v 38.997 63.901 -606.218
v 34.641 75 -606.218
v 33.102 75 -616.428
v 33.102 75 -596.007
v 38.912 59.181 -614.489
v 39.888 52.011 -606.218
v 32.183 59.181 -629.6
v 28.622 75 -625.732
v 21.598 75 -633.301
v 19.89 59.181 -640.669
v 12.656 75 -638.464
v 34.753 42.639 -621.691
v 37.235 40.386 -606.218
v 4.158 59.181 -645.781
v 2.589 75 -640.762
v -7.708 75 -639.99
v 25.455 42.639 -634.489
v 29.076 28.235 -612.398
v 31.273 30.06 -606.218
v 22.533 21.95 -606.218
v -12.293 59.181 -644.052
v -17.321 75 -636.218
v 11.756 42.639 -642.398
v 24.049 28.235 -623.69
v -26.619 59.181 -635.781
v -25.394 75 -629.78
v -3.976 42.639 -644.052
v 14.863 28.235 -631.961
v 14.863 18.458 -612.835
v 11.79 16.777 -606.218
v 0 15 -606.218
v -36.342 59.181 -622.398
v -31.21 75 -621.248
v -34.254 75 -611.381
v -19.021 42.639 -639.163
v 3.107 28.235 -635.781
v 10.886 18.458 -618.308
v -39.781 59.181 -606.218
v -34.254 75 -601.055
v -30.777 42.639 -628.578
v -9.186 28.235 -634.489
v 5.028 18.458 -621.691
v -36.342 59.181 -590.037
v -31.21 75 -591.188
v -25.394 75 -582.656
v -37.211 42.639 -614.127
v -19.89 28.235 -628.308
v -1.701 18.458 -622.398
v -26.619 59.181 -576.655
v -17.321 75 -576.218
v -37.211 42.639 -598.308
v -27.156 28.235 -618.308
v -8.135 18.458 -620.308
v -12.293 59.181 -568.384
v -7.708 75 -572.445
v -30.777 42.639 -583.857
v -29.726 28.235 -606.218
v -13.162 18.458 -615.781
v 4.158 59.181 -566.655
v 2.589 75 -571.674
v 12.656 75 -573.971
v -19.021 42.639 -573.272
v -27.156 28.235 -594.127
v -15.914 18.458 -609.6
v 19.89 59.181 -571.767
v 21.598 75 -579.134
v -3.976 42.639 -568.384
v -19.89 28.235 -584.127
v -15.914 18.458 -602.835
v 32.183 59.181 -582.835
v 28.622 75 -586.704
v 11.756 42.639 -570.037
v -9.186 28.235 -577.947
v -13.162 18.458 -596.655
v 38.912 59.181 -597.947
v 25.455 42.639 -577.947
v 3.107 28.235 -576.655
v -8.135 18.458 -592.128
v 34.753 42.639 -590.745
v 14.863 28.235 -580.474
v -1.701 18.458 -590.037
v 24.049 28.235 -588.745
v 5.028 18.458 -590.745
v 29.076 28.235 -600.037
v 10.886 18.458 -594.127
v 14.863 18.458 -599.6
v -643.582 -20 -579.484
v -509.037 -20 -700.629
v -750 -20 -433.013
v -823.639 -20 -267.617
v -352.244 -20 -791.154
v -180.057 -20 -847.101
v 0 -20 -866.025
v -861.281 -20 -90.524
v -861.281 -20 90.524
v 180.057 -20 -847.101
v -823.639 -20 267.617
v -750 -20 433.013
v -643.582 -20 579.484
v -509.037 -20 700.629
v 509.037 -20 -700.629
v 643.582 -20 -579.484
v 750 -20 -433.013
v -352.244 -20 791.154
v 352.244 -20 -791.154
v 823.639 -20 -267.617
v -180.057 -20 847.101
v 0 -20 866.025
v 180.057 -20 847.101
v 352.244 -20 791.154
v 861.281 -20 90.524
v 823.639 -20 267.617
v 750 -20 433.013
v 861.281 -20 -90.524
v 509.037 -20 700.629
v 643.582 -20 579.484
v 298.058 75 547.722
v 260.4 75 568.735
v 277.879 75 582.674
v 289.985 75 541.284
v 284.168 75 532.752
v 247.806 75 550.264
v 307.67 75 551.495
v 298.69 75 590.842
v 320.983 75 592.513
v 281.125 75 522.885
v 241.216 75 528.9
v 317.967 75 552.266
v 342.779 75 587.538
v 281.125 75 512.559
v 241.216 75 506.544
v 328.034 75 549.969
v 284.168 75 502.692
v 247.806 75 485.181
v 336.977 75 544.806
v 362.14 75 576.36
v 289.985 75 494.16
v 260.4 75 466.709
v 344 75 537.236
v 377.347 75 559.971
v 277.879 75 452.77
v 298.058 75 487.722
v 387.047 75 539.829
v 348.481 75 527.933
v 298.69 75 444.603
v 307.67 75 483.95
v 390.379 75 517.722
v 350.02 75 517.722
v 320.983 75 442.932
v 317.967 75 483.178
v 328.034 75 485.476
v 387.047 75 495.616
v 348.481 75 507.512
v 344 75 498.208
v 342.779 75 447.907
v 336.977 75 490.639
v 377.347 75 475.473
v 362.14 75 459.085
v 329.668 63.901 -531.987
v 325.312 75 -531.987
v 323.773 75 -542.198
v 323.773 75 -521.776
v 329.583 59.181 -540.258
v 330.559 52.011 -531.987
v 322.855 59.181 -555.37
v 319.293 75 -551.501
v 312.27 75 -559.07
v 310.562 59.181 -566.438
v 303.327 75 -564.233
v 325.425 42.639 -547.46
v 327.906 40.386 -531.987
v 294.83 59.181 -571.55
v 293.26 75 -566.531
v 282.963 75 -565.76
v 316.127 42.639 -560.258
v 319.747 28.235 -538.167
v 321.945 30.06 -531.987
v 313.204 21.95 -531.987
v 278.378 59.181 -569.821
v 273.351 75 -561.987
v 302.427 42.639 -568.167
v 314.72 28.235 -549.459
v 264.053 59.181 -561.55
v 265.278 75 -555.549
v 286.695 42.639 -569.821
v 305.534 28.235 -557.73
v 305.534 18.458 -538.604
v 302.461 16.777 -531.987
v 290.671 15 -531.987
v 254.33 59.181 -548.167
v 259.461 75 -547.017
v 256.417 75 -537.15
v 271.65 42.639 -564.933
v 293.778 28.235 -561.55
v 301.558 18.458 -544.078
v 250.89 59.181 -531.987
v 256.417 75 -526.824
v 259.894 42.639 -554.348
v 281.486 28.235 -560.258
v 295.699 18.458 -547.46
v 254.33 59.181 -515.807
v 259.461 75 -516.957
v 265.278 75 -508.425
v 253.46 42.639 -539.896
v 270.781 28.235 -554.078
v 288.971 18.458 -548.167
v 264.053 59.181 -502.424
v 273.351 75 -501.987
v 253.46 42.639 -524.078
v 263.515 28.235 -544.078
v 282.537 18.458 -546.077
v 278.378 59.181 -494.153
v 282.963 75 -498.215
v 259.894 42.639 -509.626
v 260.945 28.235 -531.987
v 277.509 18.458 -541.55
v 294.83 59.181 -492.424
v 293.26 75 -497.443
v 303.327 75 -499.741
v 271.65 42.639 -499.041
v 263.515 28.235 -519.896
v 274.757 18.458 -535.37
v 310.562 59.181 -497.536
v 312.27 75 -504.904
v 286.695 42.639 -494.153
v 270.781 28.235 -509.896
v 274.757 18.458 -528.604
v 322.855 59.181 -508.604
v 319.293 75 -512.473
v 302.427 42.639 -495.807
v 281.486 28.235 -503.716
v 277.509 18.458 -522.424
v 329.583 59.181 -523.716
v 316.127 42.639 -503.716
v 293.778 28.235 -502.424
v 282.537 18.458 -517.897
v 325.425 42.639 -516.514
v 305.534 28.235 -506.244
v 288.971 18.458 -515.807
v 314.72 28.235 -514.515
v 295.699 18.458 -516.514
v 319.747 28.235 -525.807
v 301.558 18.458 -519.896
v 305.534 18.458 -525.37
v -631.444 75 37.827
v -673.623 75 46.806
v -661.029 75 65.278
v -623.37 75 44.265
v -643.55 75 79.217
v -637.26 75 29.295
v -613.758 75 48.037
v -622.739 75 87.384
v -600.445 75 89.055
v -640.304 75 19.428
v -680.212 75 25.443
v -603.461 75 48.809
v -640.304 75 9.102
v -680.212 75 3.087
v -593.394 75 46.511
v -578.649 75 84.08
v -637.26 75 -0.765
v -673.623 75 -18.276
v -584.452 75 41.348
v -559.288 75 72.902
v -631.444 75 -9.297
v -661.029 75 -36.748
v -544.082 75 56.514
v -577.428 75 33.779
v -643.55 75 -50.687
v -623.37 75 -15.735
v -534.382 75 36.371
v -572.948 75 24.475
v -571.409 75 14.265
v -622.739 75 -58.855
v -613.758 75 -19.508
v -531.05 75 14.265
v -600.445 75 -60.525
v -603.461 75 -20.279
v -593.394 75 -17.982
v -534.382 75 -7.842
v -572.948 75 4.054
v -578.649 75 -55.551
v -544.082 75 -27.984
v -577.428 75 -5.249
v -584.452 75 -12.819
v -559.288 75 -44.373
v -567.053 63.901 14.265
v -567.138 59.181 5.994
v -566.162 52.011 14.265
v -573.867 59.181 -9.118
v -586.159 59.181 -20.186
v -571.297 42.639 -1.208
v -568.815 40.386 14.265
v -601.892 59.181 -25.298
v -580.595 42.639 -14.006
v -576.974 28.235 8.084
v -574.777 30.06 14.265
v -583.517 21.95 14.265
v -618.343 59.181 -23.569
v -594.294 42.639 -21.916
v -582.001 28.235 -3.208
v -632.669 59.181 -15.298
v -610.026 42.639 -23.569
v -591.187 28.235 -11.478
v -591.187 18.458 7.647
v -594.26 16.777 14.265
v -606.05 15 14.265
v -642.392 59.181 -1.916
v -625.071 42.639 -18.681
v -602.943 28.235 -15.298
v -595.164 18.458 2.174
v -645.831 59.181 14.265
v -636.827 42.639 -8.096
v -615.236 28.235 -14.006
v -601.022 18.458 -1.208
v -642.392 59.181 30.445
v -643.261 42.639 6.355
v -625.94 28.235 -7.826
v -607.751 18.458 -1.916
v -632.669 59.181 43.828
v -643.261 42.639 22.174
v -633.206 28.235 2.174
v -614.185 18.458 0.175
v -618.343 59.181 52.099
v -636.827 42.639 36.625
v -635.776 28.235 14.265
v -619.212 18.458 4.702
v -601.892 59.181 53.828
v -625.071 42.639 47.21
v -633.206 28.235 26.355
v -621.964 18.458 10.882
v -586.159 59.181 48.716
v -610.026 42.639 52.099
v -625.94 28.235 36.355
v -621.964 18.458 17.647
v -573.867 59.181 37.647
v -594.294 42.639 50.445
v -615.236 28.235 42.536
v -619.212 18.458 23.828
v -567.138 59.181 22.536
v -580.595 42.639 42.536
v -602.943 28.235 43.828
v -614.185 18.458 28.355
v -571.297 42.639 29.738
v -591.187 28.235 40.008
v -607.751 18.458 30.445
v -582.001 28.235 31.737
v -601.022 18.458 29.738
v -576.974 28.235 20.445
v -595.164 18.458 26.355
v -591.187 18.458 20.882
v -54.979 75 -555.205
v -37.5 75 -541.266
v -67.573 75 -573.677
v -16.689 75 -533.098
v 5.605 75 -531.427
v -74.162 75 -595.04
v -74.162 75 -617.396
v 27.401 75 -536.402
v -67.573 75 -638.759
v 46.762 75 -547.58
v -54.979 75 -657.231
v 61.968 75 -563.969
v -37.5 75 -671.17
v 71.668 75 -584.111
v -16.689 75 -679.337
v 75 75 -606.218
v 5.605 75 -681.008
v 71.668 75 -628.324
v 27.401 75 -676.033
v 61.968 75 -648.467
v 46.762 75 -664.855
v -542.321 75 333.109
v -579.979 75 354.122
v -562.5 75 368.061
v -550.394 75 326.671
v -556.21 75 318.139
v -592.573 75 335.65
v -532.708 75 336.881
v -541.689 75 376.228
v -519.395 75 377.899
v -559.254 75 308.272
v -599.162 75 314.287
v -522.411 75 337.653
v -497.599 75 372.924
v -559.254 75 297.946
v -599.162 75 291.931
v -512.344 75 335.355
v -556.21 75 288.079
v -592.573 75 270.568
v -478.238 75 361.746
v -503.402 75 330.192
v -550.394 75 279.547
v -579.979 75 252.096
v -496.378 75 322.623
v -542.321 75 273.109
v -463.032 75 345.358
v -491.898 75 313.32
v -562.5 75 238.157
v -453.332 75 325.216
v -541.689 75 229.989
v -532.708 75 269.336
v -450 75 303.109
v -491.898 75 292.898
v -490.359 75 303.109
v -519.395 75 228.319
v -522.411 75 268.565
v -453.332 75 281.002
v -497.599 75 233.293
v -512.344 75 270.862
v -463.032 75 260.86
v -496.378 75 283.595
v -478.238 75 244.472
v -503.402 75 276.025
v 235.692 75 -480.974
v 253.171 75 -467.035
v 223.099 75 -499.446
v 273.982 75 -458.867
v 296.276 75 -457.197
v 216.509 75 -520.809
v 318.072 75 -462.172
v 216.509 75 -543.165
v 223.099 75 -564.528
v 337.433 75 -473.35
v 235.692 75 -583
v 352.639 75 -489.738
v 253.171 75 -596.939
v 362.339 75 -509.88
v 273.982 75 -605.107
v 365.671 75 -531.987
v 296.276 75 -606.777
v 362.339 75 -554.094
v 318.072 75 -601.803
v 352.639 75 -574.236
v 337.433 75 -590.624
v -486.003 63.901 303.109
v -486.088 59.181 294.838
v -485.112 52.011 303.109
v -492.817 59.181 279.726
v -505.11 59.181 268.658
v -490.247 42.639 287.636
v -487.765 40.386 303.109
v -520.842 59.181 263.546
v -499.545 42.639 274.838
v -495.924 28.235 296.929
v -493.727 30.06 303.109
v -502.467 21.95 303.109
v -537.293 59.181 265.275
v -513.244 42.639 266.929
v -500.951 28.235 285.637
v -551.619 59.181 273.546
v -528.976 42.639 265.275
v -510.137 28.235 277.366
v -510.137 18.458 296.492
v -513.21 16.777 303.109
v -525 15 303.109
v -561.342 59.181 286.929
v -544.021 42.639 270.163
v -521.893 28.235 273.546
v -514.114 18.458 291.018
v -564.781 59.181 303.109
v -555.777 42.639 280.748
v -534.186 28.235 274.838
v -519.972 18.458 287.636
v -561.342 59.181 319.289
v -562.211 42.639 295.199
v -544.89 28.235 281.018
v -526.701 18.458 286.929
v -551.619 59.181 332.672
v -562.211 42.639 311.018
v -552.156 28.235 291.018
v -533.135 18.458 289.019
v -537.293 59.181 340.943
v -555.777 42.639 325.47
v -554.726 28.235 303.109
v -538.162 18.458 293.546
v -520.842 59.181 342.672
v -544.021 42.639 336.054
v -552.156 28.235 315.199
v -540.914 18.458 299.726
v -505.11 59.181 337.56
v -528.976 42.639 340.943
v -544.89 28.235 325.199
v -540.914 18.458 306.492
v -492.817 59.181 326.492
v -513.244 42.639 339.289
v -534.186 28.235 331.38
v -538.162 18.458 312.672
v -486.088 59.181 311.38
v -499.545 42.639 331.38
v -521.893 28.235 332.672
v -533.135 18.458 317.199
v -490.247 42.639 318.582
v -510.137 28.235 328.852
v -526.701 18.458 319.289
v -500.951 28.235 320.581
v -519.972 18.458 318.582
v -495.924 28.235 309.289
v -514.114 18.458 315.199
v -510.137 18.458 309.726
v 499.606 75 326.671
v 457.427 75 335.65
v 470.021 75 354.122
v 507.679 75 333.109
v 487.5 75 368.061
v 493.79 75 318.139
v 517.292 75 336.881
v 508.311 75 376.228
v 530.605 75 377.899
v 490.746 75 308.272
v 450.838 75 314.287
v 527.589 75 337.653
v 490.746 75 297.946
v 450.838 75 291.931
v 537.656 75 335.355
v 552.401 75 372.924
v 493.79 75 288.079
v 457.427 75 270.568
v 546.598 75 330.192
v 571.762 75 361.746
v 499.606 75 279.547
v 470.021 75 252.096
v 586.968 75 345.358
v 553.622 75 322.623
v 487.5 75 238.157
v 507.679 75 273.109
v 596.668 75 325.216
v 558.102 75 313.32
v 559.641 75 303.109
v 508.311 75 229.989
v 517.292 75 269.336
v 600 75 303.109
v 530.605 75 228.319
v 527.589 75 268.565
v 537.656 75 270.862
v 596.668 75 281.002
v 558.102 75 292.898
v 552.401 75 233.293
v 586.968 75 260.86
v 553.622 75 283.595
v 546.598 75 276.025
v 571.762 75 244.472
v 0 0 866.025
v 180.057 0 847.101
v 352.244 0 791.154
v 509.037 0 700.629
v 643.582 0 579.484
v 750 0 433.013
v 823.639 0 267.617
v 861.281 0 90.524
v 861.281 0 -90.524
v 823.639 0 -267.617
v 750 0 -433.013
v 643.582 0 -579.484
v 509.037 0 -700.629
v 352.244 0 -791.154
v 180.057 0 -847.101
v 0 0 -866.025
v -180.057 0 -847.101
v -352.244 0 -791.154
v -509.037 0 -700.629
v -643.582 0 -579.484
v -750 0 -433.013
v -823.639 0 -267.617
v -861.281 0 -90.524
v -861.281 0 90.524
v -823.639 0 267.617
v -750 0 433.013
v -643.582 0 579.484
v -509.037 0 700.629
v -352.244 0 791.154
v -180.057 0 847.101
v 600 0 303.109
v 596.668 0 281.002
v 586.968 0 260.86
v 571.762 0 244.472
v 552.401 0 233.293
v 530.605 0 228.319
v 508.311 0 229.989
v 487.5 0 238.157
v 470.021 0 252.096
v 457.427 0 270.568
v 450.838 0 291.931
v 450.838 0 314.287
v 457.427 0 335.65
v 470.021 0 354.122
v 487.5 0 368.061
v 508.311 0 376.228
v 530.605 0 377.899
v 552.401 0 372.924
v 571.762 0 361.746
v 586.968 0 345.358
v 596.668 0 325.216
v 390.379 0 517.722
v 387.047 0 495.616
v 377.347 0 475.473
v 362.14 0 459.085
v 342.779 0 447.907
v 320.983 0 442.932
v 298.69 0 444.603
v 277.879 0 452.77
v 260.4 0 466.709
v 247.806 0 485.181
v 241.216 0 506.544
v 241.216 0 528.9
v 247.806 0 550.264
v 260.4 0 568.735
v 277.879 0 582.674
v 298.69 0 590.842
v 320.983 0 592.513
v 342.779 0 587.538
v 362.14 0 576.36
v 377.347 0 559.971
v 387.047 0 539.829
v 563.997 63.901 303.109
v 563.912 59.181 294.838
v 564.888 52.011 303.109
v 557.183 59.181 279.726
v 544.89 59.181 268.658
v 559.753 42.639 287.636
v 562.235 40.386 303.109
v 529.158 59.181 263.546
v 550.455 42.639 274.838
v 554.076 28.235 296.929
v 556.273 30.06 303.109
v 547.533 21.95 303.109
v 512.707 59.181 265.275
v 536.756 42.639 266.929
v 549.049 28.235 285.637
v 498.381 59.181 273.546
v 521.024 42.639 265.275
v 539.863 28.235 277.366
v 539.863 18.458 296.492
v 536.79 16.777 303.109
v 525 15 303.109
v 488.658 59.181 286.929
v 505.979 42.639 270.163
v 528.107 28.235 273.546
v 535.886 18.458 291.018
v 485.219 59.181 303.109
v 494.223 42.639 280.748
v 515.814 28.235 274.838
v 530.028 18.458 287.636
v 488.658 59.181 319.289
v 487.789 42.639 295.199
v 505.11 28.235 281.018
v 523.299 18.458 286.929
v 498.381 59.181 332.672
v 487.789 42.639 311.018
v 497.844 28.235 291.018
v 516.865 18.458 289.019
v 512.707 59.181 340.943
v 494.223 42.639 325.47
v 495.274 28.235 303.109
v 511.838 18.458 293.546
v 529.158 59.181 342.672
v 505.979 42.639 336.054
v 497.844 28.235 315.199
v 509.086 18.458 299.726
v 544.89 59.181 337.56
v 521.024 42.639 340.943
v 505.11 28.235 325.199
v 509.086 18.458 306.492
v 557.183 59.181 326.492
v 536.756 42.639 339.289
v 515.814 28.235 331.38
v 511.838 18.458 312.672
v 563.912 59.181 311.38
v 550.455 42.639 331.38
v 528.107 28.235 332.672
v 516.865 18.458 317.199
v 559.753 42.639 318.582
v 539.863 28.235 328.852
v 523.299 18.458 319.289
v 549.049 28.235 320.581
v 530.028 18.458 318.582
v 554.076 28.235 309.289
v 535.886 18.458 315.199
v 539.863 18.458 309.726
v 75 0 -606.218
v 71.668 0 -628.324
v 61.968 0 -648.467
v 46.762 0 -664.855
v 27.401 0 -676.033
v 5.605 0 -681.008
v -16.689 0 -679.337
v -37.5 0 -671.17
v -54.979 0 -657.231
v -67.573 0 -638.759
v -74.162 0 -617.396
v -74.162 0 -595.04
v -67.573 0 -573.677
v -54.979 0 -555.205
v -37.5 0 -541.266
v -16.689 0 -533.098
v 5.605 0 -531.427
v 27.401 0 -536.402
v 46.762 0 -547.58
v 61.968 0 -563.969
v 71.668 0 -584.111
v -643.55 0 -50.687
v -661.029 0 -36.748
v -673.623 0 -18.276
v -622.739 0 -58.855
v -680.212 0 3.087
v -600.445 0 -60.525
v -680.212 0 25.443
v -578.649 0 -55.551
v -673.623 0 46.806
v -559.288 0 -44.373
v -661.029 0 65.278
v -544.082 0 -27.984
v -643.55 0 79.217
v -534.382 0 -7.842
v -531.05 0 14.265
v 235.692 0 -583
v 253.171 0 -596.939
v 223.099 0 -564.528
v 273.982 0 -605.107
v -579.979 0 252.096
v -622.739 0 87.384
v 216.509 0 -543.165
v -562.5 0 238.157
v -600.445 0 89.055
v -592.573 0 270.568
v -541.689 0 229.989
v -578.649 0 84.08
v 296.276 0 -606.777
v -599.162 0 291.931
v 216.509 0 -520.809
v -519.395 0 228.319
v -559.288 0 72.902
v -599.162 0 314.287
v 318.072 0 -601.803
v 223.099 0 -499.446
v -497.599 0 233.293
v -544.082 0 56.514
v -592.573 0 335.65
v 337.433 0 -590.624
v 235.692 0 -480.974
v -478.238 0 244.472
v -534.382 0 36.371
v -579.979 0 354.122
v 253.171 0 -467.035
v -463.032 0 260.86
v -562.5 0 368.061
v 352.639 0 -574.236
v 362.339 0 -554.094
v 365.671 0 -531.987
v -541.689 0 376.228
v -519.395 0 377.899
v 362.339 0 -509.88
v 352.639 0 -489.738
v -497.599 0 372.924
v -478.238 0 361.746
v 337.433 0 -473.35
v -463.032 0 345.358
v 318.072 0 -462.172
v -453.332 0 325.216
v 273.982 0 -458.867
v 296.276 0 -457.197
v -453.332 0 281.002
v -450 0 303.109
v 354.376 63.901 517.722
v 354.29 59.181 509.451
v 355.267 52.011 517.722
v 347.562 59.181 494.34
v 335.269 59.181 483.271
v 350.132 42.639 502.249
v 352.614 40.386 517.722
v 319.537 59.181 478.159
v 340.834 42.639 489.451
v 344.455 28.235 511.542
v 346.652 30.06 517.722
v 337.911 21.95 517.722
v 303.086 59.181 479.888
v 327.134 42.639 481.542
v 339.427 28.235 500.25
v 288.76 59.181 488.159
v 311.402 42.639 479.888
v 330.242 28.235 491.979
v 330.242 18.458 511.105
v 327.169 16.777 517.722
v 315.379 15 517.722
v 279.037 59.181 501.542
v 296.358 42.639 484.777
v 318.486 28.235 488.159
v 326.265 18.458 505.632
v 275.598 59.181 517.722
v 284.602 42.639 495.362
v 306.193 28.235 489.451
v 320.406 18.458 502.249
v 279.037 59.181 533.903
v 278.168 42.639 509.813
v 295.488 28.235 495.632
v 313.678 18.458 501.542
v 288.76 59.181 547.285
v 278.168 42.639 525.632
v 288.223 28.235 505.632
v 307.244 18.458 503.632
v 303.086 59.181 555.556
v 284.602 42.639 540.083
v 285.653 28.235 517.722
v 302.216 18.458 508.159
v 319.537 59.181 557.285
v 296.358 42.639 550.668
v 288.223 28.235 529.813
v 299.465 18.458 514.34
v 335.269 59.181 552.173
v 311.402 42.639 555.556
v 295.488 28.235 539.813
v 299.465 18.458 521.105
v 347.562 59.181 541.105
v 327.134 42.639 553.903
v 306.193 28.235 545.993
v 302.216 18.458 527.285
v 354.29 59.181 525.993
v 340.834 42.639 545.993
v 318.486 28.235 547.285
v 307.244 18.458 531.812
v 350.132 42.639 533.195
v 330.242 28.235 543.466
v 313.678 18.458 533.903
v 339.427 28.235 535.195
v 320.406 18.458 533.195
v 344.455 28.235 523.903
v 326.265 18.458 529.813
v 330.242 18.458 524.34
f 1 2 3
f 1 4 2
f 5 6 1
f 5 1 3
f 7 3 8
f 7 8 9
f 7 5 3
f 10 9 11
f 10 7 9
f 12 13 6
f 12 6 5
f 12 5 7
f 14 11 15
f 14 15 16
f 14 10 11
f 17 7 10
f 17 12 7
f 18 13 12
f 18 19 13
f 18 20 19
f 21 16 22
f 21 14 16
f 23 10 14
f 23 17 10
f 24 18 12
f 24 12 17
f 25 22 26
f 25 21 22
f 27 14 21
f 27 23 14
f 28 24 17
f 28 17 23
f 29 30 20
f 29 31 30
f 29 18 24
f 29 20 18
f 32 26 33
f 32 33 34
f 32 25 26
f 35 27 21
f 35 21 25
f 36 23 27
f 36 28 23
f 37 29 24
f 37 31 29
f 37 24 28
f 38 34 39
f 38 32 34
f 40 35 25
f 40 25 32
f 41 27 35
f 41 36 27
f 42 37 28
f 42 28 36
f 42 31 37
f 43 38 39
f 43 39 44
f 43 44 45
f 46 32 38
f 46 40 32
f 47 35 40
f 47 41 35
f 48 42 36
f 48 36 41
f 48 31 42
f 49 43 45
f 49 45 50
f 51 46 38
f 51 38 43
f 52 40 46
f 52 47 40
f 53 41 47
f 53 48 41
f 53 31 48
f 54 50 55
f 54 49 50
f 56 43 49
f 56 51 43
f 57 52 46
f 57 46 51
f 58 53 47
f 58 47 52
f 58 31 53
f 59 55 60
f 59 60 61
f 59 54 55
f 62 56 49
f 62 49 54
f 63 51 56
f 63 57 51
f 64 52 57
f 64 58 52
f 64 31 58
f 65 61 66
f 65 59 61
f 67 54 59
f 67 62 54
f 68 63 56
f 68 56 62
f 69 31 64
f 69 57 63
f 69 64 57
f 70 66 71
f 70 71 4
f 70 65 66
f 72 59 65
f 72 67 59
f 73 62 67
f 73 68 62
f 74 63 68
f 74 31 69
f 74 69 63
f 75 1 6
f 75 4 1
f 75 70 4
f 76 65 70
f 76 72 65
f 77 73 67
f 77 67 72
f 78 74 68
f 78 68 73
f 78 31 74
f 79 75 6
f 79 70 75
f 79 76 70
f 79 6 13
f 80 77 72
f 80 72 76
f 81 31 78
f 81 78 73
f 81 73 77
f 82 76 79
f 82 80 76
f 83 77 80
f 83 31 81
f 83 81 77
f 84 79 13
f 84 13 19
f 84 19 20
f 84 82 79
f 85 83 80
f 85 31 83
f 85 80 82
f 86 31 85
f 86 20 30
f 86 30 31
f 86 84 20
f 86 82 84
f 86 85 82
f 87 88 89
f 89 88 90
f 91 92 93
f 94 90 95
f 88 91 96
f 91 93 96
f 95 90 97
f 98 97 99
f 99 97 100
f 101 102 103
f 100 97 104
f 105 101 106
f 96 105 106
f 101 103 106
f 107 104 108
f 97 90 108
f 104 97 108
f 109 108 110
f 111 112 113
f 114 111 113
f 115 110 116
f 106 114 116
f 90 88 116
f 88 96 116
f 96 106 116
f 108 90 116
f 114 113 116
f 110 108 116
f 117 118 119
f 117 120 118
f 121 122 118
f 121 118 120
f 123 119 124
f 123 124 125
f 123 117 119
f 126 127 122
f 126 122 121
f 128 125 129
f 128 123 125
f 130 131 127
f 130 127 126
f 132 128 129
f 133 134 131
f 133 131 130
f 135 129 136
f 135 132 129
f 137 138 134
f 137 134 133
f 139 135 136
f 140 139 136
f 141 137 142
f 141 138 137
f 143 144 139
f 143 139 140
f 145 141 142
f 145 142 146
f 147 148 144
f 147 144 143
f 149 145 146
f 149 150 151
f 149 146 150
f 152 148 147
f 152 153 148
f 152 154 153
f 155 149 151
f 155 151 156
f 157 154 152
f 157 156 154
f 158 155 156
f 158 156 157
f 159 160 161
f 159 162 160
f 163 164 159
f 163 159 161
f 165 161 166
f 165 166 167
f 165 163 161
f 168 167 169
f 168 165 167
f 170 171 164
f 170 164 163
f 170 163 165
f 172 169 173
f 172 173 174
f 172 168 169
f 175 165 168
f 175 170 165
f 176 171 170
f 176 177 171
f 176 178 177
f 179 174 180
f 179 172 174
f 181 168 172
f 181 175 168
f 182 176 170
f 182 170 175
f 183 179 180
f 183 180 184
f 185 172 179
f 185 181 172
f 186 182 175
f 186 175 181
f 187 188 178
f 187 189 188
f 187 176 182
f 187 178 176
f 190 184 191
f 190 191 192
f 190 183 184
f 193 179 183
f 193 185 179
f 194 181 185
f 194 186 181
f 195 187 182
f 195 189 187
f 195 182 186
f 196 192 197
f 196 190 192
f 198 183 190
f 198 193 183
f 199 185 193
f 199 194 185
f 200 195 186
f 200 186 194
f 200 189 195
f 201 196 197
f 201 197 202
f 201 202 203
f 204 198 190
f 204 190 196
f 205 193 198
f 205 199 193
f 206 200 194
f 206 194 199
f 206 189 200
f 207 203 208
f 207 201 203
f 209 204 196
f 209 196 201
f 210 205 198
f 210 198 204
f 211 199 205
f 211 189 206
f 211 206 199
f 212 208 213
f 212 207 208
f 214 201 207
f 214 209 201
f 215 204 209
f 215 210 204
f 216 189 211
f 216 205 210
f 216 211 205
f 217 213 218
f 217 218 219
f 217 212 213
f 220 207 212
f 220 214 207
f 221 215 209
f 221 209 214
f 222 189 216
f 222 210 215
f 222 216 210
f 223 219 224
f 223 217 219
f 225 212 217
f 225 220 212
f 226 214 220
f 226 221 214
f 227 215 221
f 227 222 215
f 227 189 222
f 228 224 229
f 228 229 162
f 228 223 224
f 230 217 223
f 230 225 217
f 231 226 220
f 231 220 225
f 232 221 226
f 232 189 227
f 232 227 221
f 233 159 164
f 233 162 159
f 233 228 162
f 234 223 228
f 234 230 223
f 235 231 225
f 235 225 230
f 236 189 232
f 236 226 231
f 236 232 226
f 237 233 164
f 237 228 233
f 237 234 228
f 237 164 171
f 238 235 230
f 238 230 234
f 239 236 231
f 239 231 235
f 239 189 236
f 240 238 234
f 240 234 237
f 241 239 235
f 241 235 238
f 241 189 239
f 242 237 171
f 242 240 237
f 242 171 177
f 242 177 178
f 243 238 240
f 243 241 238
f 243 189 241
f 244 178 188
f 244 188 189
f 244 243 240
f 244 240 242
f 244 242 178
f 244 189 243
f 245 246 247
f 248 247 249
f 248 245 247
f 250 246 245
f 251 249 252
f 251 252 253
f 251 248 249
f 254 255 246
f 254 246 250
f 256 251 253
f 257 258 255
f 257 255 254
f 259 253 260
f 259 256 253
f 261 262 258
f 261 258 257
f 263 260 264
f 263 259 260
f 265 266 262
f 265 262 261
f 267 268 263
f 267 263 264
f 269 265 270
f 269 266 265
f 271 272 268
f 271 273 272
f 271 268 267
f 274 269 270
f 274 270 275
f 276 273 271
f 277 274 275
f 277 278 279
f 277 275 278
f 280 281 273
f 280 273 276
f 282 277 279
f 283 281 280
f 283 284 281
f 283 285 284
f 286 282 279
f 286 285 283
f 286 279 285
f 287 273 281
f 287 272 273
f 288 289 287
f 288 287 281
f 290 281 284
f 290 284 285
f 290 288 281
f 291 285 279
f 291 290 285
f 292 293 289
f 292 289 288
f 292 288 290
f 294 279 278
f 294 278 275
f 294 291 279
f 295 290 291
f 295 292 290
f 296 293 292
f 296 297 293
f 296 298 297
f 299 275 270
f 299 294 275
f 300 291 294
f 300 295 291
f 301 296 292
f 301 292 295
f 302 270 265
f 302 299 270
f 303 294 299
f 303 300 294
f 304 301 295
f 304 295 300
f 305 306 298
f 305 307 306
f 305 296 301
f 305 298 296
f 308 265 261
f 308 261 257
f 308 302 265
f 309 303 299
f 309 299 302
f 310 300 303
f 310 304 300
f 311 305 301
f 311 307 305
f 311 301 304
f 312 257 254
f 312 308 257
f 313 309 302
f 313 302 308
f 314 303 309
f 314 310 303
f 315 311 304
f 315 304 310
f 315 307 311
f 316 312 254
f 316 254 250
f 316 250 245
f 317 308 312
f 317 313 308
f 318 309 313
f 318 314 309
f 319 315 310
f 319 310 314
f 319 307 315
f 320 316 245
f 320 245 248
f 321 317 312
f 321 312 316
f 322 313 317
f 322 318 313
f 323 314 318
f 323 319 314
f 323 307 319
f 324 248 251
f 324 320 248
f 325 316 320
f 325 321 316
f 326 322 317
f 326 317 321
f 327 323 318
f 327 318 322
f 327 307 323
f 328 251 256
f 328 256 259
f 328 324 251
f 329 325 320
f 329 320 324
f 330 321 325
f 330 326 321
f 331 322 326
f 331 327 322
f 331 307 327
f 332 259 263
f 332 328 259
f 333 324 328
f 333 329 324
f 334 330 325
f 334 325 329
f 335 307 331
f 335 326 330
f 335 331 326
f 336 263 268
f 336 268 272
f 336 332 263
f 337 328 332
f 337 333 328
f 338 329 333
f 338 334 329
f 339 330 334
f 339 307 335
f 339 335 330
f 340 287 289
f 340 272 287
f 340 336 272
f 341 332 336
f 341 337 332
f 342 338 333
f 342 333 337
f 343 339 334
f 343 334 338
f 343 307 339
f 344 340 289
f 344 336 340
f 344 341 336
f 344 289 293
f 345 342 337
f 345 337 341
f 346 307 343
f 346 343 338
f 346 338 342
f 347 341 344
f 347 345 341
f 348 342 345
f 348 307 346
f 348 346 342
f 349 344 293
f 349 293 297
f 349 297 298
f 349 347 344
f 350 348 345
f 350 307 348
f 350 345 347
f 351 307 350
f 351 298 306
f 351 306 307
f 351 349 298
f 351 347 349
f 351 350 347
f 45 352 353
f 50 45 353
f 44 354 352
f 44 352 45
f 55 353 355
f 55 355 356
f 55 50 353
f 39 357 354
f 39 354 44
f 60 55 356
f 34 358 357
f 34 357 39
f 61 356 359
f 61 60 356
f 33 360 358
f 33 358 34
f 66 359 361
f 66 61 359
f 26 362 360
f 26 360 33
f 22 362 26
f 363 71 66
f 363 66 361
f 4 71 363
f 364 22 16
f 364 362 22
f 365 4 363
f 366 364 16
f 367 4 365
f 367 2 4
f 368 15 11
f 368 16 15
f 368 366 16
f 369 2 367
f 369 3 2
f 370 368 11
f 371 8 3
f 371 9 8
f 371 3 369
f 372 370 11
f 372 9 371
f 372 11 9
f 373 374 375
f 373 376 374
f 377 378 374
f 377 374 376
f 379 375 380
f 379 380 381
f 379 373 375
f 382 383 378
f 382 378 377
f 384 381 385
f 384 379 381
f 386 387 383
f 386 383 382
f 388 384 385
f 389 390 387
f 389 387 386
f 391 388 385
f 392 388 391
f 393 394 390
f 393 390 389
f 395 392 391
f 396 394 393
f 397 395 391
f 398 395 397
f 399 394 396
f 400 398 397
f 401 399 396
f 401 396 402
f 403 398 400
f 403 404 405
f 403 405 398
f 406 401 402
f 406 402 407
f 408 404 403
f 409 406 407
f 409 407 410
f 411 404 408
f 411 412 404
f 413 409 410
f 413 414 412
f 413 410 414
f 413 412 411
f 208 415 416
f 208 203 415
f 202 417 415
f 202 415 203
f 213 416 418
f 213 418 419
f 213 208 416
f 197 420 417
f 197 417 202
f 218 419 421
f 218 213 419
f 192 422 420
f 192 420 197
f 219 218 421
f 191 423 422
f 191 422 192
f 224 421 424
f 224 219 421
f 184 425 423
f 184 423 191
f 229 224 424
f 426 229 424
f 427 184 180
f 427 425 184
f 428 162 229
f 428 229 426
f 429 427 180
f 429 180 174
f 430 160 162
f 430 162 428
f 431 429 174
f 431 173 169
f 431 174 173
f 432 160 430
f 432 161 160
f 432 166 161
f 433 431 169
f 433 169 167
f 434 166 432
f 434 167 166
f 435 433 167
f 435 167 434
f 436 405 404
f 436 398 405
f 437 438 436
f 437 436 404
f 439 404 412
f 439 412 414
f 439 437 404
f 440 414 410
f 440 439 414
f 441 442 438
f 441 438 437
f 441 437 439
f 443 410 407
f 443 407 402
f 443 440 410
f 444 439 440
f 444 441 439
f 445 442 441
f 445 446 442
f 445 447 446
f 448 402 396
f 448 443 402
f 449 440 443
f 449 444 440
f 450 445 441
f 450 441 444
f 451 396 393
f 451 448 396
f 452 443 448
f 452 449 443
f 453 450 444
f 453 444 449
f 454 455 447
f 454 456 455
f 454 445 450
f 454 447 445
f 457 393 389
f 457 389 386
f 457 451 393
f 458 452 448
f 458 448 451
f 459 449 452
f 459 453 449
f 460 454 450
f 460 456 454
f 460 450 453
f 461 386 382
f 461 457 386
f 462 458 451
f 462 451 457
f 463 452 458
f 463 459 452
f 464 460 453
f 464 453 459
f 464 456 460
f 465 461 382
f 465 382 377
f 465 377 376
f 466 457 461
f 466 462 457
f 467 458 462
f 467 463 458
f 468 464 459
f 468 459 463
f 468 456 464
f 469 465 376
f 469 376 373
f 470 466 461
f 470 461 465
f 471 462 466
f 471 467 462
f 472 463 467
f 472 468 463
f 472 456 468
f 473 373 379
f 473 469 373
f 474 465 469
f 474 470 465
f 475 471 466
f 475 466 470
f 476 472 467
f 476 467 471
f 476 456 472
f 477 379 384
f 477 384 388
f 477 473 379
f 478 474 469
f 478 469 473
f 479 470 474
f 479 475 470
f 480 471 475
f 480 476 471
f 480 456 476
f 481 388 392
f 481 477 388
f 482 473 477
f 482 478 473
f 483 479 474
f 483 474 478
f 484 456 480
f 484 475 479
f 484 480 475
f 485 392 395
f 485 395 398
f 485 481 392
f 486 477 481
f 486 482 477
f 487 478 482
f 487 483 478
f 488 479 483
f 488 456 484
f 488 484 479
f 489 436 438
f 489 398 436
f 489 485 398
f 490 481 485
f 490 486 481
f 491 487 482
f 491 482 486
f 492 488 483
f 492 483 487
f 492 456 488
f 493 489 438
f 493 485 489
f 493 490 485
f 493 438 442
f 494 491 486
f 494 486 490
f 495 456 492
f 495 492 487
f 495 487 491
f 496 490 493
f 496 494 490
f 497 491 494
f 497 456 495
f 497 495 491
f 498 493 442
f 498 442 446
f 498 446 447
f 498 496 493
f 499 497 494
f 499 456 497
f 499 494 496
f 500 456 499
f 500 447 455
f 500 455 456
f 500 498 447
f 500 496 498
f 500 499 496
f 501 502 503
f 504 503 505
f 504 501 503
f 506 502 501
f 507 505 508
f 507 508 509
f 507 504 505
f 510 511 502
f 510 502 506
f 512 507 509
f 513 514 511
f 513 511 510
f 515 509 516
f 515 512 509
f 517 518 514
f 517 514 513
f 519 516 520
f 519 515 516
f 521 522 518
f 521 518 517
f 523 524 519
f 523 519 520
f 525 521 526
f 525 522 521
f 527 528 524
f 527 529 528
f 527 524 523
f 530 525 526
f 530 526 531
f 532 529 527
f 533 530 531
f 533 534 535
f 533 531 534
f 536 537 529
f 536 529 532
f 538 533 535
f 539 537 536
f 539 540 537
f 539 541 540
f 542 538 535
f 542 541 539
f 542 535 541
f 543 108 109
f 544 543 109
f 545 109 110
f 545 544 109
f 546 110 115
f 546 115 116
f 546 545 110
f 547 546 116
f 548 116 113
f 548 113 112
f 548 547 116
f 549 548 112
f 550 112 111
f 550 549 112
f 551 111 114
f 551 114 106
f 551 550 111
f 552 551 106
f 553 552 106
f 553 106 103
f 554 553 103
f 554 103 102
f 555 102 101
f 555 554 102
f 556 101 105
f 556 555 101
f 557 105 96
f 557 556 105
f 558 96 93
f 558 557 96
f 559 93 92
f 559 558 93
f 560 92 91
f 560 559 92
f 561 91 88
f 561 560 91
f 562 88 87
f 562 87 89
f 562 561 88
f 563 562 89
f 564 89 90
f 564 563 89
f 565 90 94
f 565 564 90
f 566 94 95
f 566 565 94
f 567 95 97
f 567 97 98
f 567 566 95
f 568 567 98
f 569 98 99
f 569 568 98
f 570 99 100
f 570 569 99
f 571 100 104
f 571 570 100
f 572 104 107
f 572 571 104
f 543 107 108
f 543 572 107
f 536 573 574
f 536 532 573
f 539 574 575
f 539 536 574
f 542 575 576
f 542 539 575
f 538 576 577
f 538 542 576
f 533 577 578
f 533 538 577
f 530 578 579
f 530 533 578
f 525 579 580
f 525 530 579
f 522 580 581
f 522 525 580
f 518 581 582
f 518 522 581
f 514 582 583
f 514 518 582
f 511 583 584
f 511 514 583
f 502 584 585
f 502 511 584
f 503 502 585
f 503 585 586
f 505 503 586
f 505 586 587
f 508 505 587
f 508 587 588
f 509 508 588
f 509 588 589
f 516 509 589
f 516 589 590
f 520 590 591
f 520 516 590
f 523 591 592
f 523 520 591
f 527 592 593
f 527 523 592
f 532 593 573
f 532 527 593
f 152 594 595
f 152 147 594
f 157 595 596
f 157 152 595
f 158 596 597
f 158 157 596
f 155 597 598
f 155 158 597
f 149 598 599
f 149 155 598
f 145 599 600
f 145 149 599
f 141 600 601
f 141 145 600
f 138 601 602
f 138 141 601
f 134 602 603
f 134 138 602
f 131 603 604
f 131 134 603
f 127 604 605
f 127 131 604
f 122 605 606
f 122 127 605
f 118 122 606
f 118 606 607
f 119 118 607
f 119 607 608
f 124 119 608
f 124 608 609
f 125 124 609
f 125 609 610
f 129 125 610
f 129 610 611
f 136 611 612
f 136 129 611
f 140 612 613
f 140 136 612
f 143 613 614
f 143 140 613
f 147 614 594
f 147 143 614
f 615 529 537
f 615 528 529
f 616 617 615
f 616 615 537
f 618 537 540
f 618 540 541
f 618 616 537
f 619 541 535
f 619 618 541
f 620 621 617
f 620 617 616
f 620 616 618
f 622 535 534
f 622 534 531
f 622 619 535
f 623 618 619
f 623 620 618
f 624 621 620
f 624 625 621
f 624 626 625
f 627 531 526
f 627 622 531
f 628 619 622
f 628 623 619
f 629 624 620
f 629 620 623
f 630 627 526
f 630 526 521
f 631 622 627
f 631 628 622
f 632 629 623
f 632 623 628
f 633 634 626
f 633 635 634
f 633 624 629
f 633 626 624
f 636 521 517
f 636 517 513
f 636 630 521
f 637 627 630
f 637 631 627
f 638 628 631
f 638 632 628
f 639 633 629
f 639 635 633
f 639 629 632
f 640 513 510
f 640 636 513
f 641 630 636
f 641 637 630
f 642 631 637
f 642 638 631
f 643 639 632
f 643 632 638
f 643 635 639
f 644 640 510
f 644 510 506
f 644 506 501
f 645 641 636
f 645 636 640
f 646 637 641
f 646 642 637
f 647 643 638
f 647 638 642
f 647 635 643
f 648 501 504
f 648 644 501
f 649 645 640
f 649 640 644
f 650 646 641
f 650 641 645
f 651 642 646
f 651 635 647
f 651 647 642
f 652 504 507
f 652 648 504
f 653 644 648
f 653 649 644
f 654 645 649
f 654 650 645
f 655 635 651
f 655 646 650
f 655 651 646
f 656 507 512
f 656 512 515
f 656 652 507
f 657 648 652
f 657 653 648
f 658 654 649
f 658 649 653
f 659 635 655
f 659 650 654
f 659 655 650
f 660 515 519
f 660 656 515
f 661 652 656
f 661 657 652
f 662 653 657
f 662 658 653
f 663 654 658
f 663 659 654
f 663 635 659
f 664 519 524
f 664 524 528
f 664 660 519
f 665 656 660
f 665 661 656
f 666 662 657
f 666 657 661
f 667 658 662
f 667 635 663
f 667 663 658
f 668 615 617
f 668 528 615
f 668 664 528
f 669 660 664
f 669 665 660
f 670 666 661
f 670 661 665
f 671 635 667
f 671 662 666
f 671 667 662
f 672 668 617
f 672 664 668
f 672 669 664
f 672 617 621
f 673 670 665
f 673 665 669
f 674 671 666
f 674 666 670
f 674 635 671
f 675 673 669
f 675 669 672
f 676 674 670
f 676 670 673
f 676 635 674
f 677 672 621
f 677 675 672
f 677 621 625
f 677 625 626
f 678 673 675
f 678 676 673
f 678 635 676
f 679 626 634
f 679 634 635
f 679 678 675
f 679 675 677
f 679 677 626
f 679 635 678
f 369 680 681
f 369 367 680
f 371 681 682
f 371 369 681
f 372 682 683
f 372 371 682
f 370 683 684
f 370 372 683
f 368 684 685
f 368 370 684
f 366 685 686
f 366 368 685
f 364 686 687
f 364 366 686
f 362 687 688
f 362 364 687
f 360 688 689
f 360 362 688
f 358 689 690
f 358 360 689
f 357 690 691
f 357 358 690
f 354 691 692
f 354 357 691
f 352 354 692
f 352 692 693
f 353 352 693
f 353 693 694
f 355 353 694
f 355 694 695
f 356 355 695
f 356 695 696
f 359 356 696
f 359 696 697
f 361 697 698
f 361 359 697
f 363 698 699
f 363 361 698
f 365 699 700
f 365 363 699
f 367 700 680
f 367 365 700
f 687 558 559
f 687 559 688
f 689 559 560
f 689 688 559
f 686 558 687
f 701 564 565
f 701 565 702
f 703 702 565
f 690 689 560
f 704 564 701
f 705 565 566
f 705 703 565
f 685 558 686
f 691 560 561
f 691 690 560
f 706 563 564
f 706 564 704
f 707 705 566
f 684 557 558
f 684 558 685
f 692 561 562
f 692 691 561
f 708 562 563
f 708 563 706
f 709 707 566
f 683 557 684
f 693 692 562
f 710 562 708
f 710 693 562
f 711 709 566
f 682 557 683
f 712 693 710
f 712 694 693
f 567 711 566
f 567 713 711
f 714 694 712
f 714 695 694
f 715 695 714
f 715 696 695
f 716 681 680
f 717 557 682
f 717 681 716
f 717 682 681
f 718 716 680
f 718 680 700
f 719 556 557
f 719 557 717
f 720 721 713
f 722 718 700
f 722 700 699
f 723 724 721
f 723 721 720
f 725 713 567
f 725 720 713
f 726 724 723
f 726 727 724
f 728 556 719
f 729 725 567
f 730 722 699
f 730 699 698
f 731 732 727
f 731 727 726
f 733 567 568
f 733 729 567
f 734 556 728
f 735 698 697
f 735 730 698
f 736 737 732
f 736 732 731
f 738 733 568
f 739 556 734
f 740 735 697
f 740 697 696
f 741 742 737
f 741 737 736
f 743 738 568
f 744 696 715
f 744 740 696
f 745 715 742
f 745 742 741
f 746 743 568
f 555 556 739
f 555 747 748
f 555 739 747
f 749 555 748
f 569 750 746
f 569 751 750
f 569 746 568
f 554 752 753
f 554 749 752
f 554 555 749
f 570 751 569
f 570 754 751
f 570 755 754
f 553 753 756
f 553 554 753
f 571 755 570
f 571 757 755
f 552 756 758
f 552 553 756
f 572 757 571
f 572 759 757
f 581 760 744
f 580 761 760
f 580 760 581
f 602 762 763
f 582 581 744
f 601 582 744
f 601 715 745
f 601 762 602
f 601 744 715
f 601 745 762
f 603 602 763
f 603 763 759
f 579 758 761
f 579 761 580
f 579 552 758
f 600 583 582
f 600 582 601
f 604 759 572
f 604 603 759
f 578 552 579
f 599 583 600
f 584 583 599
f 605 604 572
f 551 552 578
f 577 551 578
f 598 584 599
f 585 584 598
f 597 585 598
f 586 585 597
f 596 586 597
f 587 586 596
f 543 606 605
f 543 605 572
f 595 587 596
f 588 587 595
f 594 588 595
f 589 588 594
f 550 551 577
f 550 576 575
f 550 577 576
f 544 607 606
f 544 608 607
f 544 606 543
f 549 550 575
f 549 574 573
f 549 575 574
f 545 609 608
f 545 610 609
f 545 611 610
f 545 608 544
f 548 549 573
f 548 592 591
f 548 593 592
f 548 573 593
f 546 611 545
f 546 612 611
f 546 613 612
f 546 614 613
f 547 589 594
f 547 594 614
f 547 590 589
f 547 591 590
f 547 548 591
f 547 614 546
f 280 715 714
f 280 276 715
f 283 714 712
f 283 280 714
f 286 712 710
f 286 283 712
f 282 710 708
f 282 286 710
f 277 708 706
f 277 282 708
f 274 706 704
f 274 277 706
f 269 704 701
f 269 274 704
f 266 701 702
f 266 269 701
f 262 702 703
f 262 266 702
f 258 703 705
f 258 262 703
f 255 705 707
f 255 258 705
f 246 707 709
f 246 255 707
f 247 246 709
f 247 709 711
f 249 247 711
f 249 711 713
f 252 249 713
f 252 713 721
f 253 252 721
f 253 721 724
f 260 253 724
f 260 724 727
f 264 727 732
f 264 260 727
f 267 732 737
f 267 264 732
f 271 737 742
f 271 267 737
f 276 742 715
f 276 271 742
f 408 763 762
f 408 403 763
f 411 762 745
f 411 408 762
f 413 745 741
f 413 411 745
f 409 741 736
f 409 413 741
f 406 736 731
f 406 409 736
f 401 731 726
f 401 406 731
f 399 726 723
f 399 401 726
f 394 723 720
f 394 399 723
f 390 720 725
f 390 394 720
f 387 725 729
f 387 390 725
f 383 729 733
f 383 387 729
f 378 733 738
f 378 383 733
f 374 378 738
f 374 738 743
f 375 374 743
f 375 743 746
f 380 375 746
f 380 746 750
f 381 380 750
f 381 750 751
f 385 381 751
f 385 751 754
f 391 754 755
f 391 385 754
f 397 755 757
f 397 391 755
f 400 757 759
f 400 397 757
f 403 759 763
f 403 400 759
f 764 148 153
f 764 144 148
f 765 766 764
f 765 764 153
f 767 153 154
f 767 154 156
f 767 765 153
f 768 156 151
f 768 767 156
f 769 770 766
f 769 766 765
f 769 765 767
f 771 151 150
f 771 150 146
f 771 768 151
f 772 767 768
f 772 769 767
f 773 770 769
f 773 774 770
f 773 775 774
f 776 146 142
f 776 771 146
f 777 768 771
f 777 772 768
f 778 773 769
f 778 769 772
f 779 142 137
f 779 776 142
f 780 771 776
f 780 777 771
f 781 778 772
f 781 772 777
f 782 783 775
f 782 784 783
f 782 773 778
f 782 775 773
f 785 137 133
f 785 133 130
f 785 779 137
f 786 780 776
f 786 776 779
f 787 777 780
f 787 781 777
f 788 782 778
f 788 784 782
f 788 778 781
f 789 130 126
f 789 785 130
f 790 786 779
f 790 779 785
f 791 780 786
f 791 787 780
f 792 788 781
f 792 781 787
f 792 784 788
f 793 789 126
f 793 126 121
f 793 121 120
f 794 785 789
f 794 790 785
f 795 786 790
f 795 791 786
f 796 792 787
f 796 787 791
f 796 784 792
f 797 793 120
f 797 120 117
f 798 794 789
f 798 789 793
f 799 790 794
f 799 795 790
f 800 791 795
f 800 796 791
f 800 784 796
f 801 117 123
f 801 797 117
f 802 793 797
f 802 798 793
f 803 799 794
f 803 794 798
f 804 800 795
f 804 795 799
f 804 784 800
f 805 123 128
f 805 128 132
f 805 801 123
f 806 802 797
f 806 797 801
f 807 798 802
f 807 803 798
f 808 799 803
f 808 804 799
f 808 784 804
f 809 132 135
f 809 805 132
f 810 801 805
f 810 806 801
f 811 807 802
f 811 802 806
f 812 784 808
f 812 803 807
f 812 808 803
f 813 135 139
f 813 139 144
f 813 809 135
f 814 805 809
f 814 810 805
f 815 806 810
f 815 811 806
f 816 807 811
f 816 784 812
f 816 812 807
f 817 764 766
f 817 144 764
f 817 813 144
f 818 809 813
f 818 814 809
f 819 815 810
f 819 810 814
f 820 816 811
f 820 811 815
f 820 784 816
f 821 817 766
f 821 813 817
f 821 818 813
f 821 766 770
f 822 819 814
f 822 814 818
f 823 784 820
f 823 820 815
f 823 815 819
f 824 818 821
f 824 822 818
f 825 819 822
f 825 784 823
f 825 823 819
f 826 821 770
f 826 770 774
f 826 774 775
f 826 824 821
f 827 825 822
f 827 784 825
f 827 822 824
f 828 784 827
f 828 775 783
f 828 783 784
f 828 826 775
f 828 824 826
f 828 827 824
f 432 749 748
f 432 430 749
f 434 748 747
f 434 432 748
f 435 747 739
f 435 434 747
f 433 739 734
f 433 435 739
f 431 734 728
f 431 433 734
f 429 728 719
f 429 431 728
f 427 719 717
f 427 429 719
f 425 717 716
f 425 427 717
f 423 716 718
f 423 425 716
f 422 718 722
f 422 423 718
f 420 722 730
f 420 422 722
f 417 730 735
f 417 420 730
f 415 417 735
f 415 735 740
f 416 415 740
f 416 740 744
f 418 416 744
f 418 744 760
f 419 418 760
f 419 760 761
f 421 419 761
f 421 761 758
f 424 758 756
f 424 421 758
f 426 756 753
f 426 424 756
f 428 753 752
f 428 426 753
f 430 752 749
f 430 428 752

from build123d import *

# Parameters (mm, degrees)
SKETCH1_R          = 866.025405
EXTRUDE1_DEPTH     = 20
SKETCH2_R          = 75
CUT_EXTRUDE1_DEPTH = 10


# Read off the part's stored shape, not the designer's step: 连接重组1
with BuildPart() as part:
    # Sketch1 → Extrude1 (new body)
    with BuildSketch(Plane(origin=(0, 0, 0), x_dir=(1, 0, 0), z_dir=(0, 1, 0))):
        with Locations(Location((0, 0, 0), (0, 0, 270))):
            Circle(SKETCH1_R)
    extrude(amount=-EXTRUDE1_DEPTH)

    # Sketch2 → Cut-Extrude1 (cut)
    with BuildSketch(Plane(origin=(0, 0, 0), x_dir=(1, 0, 0), z_dir=(0, 1, 0))):
        with Locations(Location((0, 606.2177835, 0), (0, 0, 270))):
            Circle(SKETCH2_R)
        with Locations(Location((290.671285018, 531.987034708, 0), (0, 0, 270))):
            Circle(SKETCH2_R)
        with Locations(Location((525.000000737, -303.10889175, 0), (0, 0, 270))):
            Circle(SKETCH2_R)
        with Locations(Location((315.378644033, -517.72223433, 0), (0, 0, 270))):
            Circle(SKETCH2_R)
        with Locations(Location((-525.000000737, -303.10889175, 0), (0, 0, 270))):
            Circle(SKETCH2_R)
        with Locations(Location((-606.04992905, -14.264800378, 0), (0, 0, 270))):
            Circle(SKETCH2_R)
    extrude(amount=-CUT_EXTRUDE1_DEPTH, mode=Mode.SUBTRACT)

    # 连接重组1 outline → 连接重组1 (revolve)
    with BuildSketch(Plane.XY.offset(-606.2177835)):
        with BuildLine():
            Line((75, 75), (34.641016131, 75.000000035))
            ThreePointArc((34.641016131, 75.000000035), (34.641016161, 35.000000018), (0, 15))
            Line((0, 15), (0, -10))
            Line((0, -10), (75, -10))
            Line((75, -10), (75, 75))
        make_face()
    revolve(axis=Axis((0, 0, -606.2177835), (0, 1, 0)))

    # Other 1 2 outline → Other 1 2 (revolve)
    with BuildSketch(Plane(origin=(290.671285018, 0, -531.987034708), x_dir=(1, 0, 0), z_dir=(0, 0, 1))):
        with BuildLine():
            Line((75, 75), (34.641016131, 75.000000035))
            ThreePointArc((34.641016131, 75.000000035), (34.641016161, 35.000000018), (0, 15))
            Line((0, 15), (0, -10))
            Line((0, -10), (75, -10))
            Line((75, -10), (75, 75))
        make_face()
    revolve(axis=Axis((290.671285018, 0, -531.987034708), (0, 1, 0)))

    # Other 1 3 outline → Other 1 3 (revolve)
    with BuildSketch(Plane(origin=(315.378644033, 0, 517.72223433), x_dir=(1, 0, 0), z_dir=(0, 0, 1))):
        with BuildLine():
            Line((75, 75), (34.641016131, 75.000000035))
            ThreePointArc((34.641016131, 75.000000035), (34.641016161, 35.000000018), (0, 15))
            Line((0, 15), (0, -10))
            Line((0, -10), (75, -10))
            Line((75, -10), (75, 75))
        make_face()
    revolve(axis=Axis((315.378644033, 0, 517.72223433), (0, 1, 0)))

    # Other 1 4 outline → Other 1 4 (revolve)
    with BuildSketch(Plane(origin=(-525.000000737, 0, 303.10889175), x_dir=(1, 0, 0), z_dir=(0, 0, 1))):
        with BuildLine():
            Line((75, 75), (34.641016131, 75.000000035))
            ThreePointArc((34.641016131, 75.000000035), (34.641016161, 35.000000018), (0, 15))
            Line((0, 15), (0, -10))
            Line((0, -10), (75, -10))
            Line((75, -10), (75, 75))
        make_face()
    revolve(axis=Axis((-525.000000737, 0, 303.10889175), (0, 1, 0)))

    # Other 1 5 outline → Other 1 5 (revolve)
    with BuildSketch(Plane(origin=(-606.04992905, 0, 14.264800378), x_dir=(1, 0, 0), z_dir=(0, 0, 1))):
        with BuildLine():
            Line((75, 75), (34.641016131, 75.000000035))
            ThreePointArc((34.641016131, 75.000000035), (34.641016161, 35.000000018), (0, 15))
            Line((0, 15), (0, -10))
            Line((0, -10), (75, -10))
            Line((75, -10), (75, 75))
        make_face()
    revolve(axis=Axis((-606.04992905, 0, 14.264800378), (0, 1, 0)))

    # Other 1 6 outline → Other 1 6 (revolve)
    with BuildSketch(Plane(origin=(525.000000737, 0, 303.10889175), x_dir=(1, 0, 0), z_dir=(0, 0, 1))):
        with BuildLine():
            Line((75, 75), (34.641016131, 75.000000035))
            ThreePointArc((34.641016131, 75.000000035), (34.641016161, 35.000000018), (0, 15))
            Line((0, 15), (0, -10))
            Line((0, -10), (75, -10))
            Line((75, -10), (75, 75))
        make_face()
    revolve(axis=Axis((525.000000737, 0, 303.10889175), (0, 1, 0)))


solid = part.part
